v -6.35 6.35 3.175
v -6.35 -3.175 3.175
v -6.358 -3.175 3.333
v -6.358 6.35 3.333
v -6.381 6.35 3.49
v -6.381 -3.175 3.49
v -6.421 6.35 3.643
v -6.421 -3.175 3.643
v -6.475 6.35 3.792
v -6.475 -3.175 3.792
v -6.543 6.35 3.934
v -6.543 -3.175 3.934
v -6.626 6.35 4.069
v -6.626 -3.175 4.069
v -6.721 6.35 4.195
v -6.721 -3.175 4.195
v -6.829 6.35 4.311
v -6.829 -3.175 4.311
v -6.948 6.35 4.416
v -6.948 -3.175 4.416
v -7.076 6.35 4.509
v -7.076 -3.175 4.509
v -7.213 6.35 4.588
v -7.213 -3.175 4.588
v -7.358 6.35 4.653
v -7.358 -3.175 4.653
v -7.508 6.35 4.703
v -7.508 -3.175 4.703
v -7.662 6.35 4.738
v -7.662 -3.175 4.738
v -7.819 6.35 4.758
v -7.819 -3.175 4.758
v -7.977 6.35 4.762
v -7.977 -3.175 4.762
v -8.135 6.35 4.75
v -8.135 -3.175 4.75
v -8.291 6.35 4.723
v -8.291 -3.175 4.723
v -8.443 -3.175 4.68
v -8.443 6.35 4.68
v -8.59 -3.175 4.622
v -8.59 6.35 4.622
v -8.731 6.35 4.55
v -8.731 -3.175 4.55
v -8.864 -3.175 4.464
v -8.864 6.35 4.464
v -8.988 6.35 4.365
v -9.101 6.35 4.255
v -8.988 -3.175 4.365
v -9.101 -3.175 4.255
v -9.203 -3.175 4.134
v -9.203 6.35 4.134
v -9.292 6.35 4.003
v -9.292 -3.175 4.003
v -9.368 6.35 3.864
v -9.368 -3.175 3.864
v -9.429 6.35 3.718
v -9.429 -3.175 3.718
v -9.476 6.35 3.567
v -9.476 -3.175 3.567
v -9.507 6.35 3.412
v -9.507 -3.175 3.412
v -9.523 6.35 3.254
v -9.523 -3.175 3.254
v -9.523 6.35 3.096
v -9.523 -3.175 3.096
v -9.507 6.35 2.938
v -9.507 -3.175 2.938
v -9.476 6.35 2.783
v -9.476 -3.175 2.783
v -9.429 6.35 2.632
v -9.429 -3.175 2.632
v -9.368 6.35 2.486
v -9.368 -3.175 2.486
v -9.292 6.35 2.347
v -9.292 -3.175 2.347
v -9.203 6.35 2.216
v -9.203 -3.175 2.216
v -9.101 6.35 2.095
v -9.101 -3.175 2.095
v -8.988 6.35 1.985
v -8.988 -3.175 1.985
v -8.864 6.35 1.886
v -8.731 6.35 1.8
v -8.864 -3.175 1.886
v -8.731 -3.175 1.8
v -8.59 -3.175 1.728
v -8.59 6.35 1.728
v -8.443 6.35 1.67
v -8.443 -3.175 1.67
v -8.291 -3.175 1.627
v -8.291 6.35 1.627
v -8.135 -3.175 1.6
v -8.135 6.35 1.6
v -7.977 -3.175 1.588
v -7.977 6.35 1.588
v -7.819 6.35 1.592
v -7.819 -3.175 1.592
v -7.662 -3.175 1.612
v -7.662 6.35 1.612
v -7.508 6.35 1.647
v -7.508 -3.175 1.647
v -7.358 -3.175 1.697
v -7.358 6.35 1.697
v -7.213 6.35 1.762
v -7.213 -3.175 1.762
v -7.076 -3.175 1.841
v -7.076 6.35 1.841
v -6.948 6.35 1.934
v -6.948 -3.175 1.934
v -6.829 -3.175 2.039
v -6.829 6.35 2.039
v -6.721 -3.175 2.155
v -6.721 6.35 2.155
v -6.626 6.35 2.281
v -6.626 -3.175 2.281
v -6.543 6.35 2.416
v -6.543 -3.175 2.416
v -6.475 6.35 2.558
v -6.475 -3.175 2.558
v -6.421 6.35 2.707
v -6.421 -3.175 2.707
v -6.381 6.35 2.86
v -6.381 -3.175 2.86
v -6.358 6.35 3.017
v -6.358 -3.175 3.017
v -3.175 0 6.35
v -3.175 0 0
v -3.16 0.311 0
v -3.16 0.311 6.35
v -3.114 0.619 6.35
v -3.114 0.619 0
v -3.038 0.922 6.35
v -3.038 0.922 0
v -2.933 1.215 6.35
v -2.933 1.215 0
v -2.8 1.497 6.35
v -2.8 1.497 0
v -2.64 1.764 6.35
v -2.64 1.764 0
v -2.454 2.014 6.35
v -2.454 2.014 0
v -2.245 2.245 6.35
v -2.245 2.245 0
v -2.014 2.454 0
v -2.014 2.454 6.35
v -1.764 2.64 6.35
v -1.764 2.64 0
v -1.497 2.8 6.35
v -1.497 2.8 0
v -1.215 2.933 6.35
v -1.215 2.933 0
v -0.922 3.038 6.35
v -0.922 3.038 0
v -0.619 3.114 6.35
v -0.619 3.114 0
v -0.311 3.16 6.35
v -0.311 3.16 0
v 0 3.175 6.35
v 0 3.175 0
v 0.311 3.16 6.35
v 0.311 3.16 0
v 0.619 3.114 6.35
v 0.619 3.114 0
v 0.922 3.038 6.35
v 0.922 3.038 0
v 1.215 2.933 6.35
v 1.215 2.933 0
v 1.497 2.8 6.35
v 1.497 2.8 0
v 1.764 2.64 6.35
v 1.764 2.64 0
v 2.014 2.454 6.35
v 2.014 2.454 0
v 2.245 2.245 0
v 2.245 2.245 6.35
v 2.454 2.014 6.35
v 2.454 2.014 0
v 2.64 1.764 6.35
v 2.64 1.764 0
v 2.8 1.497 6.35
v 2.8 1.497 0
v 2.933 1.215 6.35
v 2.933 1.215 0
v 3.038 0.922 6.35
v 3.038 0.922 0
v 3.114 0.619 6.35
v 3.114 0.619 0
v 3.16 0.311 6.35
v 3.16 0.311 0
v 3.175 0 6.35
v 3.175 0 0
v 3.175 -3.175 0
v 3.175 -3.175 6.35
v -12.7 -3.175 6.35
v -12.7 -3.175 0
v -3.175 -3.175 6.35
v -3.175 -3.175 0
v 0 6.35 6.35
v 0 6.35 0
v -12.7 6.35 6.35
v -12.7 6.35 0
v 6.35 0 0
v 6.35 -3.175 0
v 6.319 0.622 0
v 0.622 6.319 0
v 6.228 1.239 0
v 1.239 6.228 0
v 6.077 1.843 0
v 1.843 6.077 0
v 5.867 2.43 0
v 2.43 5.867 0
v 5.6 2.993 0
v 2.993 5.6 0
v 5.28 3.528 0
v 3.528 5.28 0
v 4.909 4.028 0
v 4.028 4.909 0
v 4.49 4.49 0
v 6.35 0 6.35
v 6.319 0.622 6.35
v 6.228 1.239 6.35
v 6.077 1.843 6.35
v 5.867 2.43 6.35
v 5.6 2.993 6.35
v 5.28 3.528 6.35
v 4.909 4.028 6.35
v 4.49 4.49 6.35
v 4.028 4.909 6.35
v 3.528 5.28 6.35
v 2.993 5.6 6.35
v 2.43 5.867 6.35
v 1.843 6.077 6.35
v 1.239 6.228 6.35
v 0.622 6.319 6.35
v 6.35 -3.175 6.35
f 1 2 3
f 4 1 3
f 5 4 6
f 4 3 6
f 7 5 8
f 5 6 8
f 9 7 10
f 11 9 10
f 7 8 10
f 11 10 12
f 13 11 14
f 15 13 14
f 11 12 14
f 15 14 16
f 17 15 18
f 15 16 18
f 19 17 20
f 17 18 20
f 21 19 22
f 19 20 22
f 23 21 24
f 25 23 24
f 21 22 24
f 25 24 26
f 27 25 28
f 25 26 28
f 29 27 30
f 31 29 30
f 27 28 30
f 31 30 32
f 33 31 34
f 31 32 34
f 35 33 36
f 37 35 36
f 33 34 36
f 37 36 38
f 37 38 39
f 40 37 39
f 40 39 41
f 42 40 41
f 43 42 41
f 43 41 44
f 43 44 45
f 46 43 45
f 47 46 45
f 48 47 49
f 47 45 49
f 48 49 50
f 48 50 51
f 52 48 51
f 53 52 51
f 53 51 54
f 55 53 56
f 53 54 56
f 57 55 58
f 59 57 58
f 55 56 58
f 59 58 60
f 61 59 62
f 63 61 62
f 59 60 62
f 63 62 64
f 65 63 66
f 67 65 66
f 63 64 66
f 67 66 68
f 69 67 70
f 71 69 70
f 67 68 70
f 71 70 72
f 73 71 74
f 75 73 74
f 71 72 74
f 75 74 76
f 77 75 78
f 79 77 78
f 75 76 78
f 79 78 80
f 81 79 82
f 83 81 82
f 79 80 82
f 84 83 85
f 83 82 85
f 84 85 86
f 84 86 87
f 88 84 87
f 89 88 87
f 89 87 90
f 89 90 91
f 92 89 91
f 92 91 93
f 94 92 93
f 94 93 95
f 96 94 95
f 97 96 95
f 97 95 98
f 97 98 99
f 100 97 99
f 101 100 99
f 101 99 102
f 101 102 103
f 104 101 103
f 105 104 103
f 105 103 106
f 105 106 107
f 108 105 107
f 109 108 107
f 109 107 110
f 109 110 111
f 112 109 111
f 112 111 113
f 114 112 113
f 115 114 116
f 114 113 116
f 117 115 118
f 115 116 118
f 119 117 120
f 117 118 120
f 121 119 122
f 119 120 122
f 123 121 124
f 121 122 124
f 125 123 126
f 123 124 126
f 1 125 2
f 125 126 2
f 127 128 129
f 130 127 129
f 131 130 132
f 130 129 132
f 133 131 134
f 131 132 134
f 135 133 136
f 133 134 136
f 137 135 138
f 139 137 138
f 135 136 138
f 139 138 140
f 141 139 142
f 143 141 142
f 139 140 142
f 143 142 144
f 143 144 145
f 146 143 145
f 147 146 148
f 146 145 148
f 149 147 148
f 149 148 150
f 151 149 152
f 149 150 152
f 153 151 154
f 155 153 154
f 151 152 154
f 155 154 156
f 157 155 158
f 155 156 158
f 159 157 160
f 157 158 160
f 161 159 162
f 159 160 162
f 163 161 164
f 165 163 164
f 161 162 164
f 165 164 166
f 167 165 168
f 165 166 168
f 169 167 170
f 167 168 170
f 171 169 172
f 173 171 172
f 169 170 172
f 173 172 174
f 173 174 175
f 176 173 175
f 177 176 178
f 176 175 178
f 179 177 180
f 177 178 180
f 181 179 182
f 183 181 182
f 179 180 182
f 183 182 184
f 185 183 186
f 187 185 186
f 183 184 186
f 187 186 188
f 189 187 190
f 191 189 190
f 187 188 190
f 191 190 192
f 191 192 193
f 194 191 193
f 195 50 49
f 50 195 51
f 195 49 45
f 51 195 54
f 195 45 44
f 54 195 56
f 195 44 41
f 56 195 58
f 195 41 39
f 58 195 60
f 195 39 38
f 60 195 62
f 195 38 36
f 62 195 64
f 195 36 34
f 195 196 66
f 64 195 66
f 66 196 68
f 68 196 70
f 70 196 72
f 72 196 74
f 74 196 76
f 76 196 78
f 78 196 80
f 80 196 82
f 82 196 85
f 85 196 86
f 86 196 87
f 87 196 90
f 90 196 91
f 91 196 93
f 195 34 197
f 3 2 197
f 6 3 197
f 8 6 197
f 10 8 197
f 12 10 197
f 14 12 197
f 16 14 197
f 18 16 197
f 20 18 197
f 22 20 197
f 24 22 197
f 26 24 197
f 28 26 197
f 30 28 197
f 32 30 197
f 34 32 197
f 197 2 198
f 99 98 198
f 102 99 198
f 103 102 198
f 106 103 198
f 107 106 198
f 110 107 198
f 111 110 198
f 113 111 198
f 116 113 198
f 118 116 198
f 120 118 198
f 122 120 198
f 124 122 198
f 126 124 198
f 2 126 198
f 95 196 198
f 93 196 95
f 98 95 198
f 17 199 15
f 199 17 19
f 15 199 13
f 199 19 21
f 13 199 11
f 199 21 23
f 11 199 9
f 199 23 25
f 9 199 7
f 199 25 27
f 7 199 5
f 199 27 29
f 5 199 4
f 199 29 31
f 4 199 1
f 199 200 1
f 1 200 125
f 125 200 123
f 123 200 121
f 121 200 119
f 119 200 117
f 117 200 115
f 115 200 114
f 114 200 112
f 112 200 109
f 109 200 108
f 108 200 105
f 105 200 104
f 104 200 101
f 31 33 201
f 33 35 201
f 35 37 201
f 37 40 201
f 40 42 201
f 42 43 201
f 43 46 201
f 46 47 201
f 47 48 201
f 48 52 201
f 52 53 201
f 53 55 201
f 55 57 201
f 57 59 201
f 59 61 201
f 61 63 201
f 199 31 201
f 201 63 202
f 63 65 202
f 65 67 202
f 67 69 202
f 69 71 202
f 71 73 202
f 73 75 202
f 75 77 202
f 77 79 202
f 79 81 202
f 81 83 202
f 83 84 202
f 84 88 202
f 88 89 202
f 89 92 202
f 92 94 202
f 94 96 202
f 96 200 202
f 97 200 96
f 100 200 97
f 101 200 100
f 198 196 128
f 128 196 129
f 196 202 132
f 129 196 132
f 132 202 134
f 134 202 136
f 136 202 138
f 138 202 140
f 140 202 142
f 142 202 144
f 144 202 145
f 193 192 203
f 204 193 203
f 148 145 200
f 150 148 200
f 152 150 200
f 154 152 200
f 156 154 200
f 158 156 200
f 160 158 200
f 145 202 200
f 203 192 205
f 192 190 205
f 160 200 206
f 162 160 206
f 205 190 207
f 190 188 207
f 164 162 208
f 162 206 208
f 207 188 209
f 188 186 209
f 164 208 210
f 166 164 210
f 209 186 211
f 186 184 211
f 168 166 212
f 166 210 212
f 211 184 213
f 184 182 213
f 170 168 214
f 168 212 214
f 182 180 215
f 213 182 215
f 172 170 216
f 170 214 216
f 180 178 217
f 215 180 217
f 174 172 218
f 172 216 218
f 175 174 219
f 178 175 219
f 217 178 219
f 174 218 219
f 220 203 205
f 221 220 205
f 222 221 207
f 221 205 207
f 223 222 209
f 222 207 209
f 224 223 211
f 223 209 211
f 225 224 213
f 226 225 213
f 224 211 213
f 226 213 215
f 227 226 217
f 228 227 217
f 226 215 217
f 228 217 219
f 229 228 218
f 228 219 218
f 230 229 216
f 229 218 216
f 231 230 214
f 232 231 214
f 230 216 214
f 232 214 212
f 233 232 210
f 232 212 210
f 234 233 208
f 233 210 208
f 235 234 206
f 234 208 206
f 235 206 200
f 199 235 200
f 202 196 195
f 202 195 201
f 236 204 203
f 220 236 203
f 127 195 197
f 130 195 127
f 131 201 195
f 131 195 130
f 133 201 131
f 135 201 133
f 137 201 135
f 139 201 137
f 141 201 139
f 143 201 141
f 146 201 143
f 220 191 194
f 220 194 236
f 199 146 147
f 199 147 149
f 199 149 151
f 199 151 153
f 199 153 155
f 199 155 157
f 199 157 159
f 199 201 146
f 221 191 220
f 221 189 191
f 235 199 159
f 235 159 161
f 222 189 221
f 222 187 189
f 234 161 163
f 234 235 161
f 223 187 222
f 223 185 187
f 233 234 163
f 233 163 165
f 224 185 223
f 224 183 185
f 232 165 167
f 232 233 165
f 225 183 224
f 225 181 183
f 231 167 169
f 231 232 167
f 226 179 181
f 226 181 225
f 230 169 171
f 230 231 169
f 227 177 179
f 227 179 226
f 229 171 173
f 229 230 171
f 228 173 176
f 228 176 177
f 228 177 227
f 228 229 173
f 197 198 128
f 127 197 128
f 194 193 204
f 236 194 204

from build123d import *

# Parameters (mm, degrees)
F1_W     = 3.175
F1_H     = 9.525
F2_DEPTH = 6.35
F3_R     = 1.5875
F4_DEPTH = 9.525


with BuildPart() as f2:
    # F1 (on Top) → F2 (new body)
    with BuildSketch(Plane.XY):
        with Locations((-11.1125, 1.5875)):
            Rectangle(F1_W, F1_H)
        with Locations((-7.9375, 1.5875)):
            Rectangle(F1_W, F1_H)
        with BuildLine():
            ThreePointArc((-3.175, 0), (0, 3.175), (3.175, 0))
            Line((3.175, 0), (3.175, -3.175))
            Line((3.175, -3.175), (6.35, -3.175))
            Line((6.35, -3.175), (6.35, 0))
            ThreePointArc((6.35, 0), (4.4901280605, 4.4901280605), (0, 6.35))
            Line((0, 6.35), (-6.35, 6.35))
            Line((-6.35, 6.35), (-6.35, -3.175))
            Line((-6.35, -3.175), (-3.175, -3.175))
            Line((-3.175, -3.175), (-3.175, 0))
        make_face()
    extrude(amount=F2_DEPTH)

    # F3 (on face) → F4 (cut, through all)
    with BuildSketch(Plane.XZ.offset(3.175)):
        with Locations((-7.9375, 3.175)):
            Circle(F3_R)
    extrude(amount=-F4_DEPTH, mode=Mode.SUBTRACT)


solid = f2.part
